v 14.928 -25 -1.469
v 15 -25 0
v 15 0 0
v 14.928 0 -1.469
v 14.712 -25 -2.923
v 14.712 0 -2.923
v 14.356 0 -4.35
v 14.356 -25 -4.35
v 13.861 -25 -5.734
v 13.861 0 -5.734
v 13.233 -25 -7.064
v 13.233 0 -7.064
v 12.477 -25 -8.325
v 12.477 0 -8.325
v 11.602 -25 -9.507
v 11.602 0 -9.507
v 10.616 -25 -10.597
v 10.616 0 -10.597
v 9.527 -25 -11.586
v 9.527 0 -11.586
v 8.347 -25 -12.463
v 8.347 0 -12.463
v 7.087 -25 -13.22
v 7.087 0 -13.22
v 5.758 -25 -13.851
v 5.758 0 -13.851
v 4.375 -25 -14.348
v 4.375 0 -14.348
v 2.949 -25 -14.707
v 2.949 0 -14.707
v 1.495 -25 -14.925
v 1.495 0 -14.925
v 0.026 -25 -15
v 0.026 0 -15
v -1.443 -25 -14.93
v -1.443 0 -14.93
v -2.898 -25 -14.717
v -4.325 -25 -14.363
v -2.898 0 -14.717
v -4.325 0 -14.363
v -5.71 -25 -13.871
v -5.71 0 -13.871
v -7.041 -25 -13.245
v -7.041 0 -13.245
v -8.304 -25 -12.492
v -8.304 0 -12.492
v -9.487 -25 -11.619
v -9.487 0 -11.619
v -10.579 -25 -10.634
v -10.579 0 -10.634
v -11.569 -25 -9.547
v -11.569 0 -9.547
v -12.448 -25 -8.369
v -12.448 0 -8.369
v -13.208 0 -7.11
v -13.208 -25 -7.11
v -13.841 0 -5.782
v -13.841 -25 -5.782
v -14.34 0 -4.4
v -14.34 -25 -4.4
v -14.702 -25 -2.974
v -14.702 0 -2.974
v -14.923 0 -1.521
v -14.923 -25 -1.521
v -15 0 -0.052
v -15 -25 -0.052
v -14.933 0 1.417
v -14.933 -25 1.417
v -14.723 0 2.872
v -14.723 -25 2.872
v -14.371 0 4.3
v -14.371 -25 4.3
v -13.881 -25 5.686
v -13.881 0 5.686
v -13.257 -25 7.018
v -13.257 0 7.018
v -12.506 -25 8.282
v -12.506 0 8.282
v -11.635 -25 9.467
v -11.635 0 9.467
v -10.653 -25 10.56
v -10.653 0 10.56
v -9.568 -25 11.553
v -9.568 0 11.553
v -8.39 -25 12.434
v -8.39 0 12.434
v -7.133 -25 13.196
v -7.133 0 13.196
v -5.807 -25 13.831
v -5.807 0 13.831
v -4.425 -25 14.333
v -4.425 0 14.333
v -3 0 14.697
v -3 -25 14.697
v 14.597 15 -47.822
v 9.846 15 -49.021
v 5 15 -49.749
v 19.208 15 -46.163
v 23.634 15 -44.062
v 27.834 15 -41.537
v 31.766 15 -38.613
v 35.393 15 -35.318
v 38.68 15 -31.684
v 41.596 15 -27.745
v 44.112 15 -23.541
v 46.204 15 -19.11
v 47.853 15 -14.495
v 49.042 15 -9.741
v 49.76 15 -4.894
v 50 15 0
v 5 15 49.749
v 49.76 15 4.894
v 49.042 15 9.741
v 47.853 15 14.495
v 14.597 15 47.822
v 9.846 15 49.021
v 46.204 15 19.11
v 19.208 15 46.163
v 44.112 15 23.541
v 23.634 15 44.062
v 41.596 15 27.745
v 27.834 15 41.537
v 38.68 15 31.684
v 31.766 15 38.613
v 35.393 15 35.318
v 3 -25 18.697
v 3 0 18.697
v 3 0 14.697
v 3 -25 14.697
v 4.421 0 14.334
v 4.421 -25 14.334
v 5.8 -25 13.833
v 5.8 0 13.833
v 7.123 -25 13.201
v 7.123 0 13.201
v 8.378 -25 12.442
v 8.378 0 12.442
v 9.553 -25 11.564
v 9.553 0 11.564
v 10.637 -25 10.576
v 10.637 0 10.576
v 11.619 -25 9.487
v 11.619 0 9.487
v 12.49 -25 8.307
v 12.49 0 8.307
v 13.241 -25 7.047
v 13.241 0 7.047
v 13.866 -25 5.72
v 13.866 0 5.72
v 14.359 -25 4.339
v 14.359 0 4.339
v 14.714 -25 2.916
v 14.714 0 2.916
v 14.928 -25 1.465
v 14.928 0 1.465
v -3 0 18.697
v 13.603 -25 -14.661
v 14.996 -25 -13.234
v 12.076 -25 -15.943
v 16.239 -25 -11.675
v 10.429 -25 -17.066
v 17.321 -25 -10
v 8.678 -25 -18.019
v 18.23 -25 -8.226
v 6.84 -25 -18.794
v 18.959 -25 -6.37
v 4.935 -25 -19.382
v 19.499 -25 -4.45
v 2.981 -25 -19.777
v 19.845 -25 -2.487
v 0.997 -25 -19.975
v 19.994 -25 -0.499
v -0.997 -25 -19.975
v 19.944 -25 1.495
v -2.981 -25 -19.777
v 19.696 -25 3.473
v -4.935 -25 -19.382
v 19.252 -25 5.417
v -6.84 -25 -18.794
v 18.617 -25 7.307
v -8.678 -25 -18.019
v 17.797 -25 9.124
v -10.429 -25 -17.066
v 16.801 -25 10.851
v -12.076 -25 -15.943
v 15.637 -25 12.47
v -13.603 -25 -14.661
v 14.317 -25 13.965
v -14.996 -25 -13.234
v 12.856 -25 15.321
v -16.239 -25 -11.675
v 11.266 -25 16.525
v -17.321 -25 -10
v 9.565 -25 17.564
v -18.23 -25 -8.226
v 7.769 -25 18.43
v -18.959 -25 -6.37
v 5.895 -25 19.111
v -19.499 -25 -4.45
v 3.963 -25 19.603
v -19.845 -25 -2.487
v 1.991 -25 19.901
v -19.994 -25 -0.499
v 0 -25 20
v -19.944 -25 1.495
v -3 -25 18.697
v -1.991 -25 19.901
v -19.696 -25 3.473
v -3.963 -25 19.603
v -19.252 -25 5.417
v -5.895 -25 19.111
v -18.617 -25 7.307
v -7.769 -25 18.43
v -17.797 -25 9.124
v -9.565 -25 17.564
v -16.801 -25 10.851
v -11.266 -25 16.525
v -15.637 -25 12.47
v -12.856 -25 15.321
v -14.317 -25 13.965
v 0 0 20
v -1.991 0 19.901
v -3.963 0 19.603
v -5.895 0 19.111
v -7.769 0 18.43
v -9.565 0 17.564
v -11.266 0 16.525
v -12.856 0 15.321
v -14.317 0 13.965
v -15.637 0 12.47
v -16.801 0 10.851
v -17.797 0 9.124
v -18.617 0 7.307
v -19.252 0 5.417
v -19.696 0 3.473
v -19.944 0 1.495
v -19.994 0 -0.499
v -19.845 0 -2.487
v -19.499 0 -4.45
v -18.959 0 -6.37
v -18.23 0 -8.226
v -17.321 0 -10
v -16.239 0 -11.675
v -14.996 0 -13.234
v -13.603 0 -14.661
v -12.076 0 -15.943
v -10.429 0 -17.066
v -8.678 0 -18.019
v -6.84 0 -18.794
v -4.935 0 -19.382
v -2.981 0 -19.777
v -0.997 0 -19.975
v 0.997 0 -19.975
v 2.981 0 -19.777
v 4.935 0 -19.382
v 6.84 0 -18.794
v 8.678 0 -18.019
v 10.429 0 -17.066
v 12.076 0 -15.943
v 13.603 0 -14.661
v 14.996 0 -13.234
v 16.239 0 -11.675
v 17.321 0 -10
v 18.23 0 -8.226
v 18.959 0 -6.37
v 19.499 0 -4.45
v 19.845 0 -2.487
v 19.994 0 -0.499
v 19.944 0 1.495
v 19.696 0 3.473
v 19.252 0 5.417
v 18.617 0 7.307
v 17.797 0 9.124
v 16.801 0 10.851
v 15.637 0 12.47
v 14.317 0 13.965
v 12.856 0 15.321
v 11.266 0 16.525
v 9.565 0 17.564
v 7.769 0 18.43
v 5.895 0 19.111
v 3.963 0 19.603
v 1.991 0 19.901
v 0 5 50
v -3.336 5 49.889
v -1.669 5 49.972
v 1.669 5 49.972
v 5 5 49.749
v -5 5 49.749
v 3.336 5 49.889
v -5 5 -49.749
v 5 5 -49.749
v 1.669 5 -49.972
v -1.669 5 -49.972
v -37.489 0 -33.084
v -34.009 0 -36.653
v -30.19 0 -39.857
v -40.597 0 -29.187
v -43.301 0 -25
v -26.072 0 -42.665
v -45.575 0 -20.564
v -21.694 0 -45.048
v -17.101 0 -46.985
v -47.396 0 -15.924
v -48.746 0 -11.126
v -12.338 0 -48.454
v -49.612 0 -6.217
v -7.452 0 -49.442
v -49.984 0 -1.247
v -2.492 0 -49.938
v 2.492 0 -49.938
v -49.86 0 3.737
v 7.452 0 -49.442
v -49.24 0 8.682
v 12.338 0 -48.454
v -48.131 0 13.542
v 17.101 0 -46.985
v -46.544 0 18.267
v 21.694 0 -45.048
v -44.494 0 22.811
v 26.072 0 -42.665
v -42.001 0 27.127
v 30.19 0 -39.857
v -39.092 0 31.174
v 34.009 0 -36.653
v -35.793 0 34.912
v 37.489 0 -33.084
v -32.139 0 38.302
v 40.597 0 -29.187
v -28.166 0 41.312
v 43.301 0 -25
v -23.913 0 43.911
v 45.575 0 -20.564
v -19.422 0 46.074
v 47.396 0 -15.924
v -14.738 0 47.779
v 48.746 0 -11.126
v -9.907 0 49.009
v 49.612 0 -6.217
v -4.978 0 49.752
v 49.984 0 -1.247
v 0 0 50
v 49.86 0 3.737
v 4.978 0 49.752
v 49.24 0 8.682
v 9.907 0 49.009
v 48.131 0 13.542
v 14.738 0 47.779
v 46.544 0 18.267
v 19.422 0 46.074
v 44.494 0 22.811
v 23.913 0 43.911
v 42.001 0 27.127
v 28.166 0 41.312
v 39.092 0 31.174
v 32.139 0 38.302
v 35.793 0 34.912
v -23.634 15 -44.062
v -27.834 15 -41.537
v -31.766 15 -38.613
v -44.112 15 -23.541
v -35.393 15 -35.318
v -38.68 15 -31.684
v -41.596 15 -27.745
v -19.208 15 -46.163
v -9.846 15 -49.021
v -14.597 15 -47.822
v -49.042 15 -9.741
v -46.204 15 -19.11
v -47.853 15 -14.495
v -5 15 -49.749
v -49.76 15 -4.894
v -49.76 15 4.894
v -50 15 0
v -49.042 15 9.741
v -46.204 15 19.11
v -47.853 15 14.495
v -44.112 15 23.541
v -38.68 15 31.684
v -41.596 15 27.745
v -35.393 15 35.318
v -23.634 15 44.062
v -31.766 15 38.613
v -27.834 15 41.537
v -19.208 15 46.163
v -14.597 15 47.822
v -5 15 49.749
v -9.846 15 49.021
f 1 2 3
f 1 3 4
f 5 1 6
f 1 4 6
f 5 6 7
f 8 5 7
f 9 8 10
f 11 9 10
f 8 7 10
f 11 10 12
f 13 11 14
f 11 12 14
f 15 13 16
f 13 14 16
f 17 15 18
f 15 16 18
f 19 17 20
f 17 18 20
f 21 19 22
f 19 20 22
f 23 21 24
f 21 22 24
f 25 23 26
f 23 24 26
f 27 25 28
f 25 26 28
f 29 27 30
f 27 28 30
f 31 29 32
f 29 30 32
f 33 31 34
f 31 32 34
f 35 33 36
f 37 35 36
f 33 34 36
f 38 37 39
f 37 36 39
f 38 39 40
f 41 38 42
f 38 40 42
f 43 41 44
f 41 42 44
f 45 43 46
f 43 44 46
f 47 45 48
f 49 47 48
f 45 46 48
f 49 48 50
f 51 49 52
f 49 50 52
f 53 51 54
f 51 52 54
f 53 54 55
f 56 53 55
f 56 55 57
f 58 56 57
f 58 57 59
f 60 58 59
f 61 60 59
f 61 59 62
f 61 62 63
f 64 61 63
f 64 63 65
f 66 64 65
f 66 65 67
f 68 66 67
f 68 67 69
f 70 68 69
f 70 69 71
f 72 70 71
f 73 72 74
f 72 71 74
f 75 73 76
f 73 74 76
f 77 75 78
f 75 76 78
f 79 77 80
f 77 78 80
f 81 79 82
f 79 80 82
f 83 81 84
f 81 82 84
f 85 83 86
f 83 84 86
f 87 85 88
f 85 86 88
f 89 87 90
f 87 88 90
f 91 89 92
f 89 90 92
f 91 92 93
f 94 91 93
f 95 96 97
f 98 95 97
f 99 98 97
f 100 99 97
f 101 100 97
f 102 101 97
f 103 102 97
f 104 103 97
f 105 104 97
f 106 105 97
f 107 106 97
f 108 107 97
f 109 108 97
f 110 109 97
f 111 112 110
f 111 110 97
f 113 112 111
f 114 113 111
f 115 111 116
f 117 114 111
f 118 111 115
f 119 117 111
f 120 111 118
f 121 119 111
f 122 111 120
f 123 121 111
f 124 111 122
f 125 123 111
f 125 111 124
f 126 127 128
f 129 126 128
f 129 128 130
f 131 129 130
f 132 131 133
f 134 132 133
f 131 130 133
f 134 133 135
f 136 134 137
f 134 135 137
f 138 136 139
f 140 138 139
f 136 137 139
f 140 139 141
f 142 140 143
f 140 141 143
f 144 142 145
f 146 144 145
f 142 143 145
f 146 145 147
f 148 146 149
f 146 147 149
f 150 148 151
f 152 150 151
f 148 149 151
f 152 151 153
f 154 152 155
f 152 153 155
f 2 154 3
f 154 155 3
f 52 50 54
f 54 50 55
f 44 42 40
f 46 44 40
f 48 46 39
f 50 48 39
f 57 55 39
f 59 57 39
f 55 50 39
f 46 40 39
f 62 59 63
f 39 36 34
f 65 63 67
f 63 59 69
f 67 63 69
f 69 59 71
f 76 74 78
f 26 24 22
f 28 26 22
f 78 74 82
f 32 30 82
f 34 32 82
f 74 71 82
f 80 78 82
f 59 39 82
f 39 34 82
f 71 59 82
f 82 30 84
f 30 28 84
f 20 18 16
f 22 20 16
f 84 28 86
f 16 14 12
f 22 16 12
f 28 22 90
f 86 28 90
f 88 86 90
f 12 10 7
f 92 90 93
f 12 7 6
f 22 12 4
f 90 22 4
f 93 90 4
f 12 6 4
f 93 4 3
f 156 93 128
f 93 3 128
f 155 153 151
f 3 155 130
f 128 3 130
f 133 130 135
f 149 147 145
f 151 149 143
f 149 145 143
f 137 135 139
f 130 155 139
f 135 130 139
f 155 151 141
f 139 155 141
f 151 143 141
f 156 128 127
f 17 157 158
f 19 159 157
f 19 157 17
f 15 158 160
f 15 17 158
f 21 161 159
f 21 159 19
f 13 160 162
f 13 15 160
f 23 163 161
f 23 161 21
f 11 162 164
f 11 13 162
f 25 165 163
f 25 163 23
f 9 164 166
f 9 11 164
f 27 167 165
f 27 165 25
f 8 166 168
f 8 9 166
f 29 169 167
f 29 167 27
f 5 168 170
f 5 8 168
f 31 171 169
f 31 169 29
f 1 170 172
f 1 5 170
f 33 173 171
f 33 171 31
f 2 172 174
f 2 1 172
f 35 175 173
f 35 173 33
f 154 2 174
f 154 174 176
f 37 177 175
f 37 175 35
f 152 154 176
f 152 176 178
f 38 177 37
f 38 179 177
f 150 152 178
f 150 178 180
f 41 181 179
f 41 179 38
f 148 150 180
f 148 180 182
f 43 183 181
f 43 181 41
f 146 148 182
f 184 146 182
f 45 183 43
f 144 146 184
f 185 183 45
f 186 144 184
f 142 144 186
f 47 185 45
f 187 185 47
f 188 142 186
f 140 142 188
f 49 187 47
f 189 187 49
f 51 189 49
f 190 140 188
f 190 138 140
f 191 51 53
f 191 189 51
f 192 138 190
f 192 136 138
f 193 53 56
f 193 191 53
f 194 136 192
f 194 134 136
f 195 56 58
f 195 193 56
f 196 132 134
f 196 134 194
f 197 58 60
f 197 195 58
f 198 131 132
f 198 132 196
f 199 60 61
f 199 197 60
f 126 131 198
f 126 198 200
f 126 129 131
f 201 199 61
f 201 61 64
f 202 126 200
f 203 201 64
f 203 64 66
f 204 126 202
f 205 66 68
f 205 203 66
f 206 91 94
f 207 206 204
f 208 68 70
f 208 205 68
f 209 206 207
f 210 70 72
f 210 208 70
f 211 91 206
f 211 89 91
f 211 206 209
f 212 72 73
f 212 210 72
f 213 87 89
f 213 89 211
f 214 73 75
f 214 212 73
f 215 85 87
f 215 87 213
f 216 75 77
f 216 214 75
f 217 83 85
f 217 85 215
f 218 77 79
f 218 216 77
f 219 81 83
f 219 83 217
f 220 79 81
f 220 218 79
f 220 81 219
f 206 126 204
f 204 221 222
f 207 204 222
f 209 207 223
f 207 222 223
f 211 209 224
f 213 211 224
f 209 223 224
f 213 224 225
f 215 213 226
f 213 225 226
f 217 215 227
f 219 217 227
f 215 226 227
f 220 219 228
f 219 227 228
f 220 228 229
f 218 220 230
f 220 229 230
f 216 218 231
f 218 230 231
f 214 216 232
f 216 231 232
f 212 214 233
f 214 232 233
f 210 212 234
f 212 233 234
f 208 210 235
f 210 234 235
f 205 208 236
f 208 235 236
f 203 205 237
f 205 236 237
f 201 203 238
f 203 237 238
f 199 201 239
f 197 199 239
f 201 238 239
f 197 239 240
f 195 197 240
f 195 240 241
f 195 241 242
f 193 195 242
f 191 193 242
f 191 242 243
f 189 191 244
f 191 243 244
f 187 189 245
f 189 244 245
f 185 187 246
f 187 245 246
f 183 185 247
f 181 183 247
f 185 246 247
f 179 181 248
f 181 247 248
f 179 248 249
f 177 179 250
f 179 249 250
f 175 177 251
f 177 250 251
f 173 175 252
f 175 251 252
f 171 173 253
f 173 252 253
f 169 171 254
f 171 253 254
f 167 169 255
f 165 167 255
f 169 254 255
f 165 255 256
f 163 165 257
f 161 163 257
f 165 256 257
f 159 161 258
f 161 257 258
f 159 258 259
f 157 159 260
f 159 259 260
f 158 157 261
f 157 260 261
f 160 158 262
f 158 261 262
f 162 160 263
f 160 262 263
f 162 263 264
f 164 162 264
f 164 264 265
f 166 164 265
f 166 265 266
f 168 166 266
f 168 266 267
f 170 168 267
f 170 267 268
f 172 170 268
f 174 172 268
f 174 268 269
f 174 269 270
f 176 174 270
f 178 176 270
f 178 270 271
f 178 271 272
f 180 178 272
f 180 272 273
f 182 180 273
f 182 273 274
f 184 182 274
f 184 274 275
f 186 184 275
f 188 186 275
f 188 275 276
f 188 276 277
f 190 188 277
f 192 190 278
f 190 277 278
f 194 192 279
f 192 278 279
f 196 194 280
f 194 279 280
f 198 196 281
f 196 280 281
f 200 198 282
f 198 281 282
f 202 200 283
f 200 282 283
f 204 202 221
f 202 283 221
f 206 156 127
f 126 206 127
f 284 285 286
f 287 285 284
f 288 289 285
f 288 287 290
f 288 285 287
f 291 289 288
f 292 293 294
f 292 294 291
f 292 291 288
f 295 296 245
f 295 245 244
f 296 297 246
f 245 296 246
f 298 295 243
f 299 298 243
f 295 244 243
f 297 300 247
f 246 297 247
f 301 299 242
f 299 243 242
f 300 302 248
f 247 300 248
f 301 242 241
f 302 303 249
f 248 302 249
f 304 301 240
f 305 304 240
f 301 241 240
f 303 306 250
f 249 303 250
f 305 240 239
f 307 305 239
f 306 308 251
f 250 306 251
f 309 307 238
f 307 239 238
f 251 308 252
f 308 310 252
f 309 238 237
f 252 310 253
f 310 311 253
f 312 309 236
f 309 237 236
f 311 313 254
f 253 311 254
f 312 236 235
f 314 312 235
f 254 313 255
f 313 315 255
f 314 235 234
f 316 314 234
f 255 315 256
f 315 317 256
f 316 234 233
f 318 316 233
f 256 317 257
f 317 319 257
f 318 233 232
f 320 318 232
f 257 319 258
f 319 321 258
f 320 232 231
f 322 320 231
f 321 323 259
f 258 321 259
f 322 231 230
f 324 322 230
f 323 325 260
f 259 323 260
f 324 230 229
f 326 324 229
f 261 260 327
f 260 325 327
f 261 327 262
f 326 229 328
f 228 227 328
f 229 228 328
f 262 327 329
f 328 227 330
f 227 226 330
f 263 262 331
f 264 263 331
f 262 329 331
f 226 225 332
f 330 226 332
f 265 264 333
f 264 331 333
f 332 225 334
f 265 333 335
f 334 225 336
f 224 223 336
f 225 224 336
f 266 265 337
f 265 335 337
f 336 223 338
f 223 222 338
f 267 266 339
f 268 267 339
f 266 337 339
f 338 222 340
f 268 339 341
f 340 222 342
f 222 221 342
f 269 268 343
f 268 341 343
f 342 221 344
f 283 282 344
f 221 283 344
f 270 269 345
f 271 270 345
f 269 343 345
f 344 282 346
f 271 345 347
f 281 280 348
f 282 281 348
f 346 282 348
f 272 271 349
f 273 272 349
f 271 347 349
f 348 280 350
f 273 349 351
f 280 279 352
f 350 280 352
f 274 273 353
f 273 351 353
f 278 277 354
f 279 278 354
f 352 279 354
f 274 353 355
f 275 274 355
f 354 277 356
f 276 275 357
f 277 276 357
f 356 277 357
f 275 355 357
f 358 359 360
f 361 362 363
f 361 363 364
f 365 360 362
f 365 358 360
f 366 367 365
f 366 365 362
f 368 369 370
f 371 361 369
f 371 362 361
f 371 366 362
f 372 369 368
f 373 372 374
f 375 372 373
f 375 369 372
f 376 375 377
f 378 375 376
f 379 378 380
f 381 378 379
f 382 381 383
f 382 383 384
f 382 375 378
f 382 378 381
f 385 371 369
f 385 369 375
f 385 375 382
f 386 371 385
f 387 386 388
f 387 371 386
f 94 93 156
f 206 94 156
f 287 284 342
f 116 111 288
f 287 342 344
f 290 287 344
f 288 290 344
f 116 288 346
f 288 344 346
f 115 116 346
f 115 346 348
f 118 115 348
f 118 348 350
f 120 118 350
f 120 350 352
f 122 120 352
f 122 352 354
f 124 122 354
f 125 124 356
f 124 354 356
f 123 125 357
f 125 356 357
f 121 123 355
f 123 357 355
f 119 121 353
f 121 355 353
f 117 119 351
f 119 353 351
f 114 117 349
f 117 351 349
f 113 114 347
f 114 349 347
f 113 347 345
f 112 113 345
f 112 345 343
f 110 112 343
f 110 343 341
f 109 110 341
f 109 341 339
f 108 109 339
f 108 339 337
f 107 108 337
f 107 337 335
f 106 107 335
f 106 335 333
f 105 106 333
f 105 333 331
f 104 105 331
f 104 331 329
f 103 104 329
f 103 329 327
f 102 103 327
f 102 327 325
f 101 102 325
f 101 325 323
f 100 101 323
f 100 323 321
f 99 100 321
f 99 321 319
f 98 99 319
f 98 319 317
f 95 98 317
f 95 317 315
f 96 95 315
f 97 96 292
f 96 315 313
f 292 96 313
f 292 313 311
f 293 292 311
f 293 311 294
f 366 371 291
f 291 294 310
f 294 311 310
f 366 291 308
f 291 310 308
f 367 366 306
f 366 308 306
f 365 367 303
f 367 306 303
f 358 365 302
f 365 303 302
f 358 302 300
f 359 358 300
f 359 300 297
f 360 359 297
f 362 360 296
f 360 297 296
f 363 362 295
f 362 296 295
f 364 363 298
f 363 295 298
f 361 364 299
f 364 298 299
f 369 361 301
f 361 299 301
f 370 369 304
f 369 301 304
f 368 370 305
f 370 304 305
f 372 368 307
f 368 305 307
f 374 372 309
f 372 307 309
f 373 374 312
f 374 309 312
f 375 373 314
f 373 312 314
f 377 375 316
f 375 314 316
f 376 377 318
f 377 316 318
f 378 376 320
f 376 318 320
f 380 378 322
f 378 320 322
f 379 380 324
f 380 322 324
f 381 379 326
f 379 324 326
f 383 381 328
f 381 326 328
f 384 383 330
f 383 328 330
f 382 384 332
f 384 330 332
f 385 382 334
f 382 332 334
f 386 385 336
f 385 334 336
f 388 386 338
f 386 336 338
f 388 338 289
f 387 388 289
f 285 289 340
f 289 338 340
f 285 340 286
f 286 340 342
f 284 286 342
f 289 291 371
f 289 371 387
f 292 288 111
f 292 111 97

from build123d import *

# Parameters (mm, degrees)
SKETCH1_R           = 50
BOSS_EXTRUDE1_DEPTH = 15
CUT_EXTRUDE1_START  = -10
CUT_EXTRUDE1_DEPTH  = 10
SKETCH3_R           = 20
BOSS_EXTRUDE2_DEPTH = 25


with BuildPart() as part:
    # Sketch1 → Boss-Extrude1 (new body)
    with BuildSketch(Plane(origin=(0, 0, 0), x_dir=(1, 0, 0), z_dir=(0, 1, 0))):
        with Locations(Location((0, 0, 0), (0, 0, 270))):
            Circle(SKETCH1_R)
    extrude(amount=BOSS_EXTRUDE1_DEPTH)

    # Sketch2 → Cut-Extrude1 (cut)
    with BuildSketch(Plane(origin=(0, 15, 0), x_dir=(1, 0, 0), z_dir=(0, 1, 0)).offset(CUT_EXTRUDE1_START)):
        with BuildLine():
            Line((-5, 49.749371855), (-5, -49.749371855))
            ThreePointArc((-5, -49.749371855), (0, -50), (5, -49.749371855))
            Line((5, -49.749371855), (5, 49.749371855))
            ThreePointArc((5, 49.749371855), (0, 50), (-5, 49.749371855))
        make_face()
    extrude(amount=CUT_EXTRUDE1_DEPTH, mode=Mode.SUBTRACT)

    # Sketch3 → Boss-Extrude2 (add)
    with BuildSketch(Plane.XZ):
        with Locations(Location((0, 0, 0), (0, 0, 90))):
            Circle(SKETCH3_R)
        with BuildLine():
            Line((3, 18.696938457), (3, 14.696938457))
            ThreePointArc((3, 14.696938457), (11.618950039, 9.486832981), (15, 0))
            ThreePointArc((15, 0), (-9.486832981, -11.618950039), (-3, 14.696938457))
            Line((-3, 14.696938457), (-3, 18.696938457))
            Line((-3, 18.696938457), (3, 18.696938457))
        make_face(mode=Mode.SUBTRACT)
    extrude(amount=BOSS_EXTRUDE2_DEPTH)


solid = part.part
